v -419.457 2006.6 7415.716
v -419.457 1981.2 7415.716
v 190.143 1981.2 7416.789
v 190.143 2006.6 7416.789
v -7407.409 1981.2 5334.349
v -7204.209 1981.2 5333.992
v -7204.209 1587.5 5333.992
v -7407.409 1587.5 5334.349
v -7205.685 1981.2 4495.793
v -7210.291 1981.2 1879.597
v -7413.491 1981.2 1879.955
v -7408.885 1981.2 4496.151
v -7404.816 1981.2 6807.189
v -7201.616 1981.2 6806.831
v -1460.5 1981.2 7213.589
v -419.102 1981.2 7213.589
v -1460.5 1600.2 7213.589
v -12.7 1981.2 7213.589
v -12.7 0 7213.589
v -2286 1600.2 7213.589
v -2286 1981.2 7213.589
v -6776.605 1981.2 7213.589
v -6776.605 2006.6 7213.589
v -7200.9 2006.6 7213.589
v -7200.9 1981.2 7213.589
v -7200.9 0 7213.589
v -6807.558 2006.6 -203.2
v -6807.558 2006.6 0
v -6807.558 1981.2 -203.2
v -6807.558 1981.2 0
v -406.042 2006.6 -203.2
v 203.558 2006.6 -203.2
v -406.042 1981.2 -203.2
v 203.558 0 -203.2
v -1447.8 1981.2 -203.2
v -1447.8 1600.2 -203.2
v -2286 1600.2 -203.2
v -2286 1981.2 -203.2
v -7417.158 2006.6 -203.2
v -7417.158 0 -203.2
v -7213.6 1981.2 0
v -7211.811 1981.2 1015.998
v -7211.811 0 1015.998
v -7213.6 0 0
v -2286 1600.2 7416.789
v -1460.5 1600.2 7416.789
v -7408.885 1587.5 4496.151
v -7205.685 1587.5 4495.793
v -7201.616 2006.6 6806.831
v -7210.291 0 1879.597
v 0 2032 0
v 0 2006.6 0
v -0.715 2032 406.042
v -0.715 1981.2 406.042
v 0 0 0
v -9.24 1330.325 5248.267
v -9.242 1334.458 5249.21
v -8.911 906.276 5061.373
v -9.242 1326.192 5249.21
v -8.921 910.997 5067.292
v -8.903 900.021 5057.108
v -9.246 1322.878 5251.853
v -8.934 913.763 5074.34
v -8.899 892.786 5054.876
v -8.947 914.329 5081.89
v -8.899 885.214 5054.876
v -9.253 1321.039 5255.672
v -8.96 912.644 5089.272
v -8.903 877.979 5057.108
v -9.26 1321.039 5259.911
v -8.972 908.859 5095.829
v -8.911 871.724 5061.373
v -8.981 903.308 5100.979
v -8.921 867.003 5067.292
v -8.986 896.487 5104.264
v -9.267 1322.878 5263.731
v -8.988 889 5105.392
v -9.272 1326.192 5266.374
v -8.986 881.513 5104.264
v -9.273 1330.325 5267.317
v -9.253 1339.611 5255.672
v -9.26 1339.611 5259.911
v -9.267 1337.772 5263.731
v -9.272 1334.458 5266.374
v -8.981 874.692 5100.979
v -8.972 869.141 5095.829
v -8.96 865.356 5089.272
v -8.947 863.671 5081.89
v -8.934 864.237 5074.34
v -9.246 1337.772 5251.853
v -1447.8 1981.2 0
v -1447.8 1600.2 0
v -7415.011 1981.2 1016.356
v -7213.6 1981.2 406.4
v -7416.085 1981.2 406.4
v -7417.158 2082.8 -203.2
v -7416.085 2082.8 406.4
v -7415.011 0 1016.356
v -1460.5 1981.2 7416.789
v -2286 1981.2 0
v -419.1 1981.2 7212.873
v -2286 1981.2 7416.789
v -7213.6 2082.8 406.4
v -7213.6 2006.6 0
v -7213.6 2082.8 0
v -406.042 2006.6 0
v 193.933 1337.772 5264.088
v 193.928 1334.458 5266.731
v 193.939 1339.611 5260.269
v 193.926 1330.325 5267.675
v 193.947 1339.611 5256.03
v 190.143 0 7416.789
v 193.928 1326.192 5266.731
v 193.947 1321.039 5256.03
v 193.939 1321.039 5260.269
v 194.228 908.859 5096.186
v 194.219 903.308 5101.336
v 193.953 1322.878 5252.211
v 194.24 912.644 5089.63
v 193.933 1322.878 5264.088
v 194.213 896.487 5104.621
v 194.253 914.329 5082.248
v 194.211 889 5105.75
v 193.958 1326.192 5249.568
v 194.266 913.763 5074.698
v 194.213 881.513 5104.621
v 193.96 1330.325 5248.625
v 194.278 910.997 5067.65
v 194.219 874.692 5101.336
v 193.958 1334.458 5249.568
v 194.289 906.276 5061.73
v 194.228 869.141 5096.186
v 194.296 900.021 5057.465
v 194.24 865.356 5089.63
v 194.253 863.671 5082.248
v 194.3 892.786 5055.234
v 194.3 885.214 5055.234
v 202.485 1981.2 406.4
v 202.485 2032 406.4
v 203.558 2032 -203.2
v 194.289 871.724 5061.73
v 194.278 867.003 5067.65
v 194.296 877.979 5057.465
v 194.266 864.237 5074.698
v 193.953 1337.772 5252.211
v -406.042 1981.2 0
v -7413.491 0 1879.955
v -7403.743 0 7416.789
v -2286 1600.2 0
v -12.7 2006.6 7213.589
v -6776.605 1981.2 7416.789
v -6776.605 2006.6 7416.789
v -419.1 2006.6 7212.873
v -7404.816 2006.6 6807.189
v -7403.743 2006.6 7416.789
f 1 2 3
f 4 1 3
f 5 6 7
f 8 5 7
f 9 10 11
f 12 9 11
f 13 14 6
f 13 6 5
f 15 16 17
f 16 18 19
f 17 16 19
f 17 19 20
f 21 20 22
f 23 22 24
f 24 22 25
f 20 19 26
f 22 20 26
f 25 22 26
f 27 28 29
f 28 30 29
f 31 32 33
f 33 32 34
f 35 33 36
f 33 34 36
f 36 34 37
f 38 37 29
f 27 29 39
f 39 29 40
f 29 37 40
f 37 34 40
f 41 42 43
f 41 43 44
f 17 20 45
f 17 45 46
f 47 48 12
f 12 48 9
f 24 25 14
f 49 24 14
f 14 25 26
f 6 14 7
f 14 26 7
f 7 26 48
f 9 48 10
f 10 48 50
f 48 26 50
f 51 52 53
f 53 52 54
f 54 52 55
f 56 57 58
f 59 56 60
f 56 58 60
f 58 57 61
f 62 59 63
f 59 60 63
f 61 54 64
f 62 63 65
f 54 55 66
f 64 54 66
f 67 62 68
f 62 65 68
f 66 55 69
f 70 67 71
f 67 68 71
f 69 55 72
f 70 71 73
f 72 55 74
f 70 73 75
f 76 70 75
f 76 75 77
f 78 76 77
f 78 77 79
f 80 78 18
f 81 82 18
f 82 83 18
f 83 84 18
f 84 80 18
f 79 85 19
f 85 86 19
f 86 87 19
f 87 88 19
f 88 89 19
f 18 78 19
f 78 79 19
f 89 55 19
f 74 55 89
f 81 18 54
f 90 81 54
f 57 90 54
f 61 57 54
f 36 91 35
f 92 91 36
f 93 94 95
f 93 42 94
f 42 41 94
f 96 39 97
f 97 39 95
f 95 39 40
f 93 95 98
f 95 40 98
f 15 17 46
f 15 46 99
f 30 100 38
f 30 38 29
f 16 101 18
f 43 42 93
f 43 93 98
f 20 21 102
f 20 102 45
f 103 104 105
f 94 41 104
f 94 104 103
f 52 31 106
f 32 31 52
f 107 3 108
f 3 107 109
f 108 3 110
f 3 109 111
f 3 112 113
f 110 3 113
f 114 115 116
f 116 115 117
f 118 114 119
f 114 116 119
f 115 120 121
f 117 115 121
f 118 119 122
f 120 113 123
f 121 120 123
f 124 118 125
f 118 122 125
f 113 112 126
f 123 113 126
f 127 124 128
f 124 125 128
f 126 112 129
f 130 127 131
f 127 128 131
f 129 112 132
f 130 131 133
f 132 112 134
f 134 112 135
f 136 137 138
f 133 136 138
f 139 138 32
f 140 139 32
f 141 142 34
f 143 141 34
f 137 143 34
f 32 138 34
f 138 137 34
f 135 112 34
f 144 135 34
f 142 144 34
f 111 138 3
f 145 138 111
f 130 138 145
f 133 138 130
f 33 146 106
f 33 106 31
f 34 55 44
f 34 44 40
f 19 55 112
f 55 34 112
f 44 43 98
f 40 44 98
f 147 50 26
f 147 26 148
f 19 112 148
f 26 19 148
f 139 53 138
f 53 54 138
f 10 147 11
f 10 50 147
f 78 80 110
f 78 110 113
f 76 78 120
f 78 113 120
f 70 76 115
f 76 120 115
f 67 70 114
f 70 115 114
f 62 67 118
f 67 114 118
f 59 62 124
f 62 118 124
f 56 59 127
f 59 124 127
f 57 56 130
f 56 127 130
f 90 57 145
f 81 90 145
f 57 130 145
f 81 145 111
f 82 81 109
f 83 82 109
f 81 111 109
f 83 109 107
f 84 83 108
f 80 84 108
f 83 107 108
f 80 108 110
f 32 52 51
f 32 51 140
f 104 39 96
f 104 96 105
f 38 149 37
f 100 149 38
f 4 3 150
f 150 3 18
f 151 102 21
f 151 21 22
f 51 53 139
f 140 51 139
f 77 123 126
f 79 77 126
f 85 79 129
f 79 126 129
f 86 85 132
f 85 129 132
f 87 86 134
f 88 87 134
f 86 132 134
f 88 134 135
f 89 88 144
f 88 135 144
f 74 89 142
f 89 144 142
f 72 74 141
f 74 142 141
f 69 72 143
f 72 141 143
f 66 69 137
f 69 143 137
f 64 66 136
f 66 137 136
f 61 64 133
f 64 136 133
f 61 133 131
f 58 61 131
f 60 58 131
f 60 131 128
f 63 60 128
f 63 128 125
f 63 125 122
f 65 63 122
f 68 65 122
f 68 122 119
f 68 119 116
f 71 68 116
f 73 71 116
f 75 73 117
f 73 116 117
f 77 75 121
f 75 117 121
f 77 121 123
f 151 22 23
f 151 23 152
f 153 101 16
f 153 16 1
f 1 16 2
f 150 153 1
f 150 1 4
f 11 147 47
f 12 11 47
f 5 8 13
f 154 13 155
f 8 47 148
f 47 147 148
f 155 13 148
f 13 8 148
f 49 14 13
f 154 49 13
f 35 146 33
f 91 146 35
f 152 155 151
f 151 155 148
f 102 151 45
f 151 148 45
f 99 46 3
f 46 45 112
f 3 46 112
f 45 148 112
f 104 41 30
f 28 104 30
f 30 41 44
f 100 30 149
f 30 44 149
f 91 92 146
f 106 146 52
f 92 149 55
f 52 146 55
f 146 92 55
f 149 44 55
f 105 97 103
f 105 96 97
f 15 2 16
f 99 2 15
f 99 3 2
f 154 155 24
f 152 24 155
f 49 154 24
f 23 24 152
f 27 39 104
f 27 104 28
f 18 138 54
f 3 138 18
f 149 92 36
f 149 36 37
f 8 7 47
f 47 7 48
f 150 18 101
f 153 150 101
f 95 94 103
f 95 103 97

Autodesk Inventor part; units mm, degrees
ref_plane "YZ Plane" through (0, 0, 0) normal (1, 0, 0) x (0, 1, 0)
ref_plane "XZ Plane" through (0, 0, 0) normal (0, 1, 0) x (-1, 0, 0)
sketch "Sketch1" plane through (0, 0, 0) normal (0, 1, 0) x (-1, 0, 0)
  line L0 (0, 0) -> (12.7, 7213.5888)
  line L1 (12.7, 7213.5888) -> (7200.9, 7213.5888)
  line L2 (7200.9, 7213.5888) -> (7213.6, 0)
  line L3 (7213.6, 0) -> (0, 0)
  line L4 (7403.7426, 7416.7888) -> (-190.1426, 7416.7888)
  line L5 (-190.1426, 7416.7888) -> (-203.5581, -203.2)
  line L6 (-203.5581, -203.2) -> (7417.1581, -203.2)
  line L7 (7417.1581, -203.2) -> (7403.7426, 7416.7888)
  dimension "d1" = 7188.2
  dimension "d3" = 12.7
  dimension "d4" = 7213.6
  dimension "d5" = 7213.6
  dimension "d6" = 203.2
  dimension "d8" = 7213.6
extrude "Extrusion1" add sketch "Sketch1" along normal blind 1981.2
sketch "Sketch3" plane through (-12.7, 0, 7213.5888) normal (0, 0, -1) x (-1, 0, 0)
  line L0 (7391.0426, 1981.2) -> (-202.8426, 1981.2) projected
  line L1 (2273.3, 2006.6) -> (2273.3, 1600.2)
  line L2 (2273.3, 1600.2) -> (1447.8, 1600.2)
  line L3 (1447.8, 1600.2) -> (1447.8, 2006.6)
  line L4 (0, 0) -> (0, 1981.2) projected
  line L5 (0, 0) -> (7188.2, 0) projected
  line L6 (1447.8, 2006.6) -> (2273.3, 2006.6)
  point P0 (-12.7, 0)
  dimension "d20" = 1447.8
  dimension "d102" = 825.5
  dimension "d103" = 406.4
  dimension "d104" = 25.4
extrude "Extrusion2" cut sketch "Sketch3" against normal up to surface (203.2 mm away)
sketch "Sketch4" plane through (-12.7, 0, 7213.5888) normal (-0.9999985, 0, -0.0017606) x (-0.0017606, 0, 0.9999985)
  line L0 (-7213.6, 0) -> (0, 0) projected
  line L1 (-7213.6, 0) -> (-7213.6, 1981.2) projected
  point P0 (-1955.8, 1330.325)
  dimension "d27" = 1330.325
  dimension "d28" = 5257.8
hole "Hole1" at (-9.2567, 1330.325, 5257.7919) direction (0.9999985, 0, 0.0017606) diameter 19.05 end through all
sketch "Sketch5" plane through (-12.7, 0, 7213.5888) normal (-0.9999985, 0, -0.0017606) x (-0.0017606, 0, 0.9999985)
  line L0 (-7213.6, 0) -> (0, 0) projected
  line L1 (-7213.6, 0) -> (-7213.6, 1981.2) projected
  point P0 (-2133.6, 889)
  dimension "d36" = 889
  dimension "d37" = 5080
hole "Hole2" at (-8.9437, 889, 5079.9921) direction (0.9999985, 0, 0.0017606) diameter 50.8 end through all
sketch "Sketch6" plane through (-7213.6, 0, 0) normal (0, 0, 1) x (1, 0, 0)
  line L0 (7417.1581, 1981.2) -> (-203.5581, 1981.2) projected
  line L1 (7213.6, 0) -> (7213.6, 1981.2) projected
  line L2 (0, 0) -> (7213.6, 0) projected
  line L3 (5765.8, 1600.2) -> (4927.6, 1600.2)
  line L4 (4927.6, 1600.2) -> (4927.6, 2006.6)
  line L5 (4927.6, 2006.6) -> (5765.8, 2006.6)
  line L6 (5765.8, 2006.6) -> (5765.8, 1600.2)
  dimension "d105" = 406.4
  dimension "d106" = 1447.8
  dimension "d107" = 838.2
  dimension "d108" = 25.4
extrude "Extrusion3" cut sketch "Sketch6" against normal up to surface (203.2 mm away)
sketch "Sketch8" plane through (-7200.9, 0, 7213.5888) normal (0.9999985, 0, -0.0017606) x (-0.0017606, 0, -0.9999985)
  line L0 (2717.8, 2070.1) -> (1879.6, 2070.1)
  line L1 (1879.6, 2070.1) -> (1879.6, 1587.5)
  line L2 (1879.6, 1587.5) -> (2717.8, 1587.5)
  line L3 (2717.8, 1587.5) -> (2717.8, 2070.1)
  line L4 (0, 0) -> (0, 1981.2) projected
  line L5 (0, 0) -> (7213.6, 0) projected
  point P0 (7200.9, 0)
  point P1 (4368.8, 0)
  dimension "d56" = 2717.8
  dimension "d118" = 1587.5
  dimension "d119" = 482.6
  dimension "d120" = 838.2
extrude "Extrusion5" cut sketch "Sketch8" against normal up to surface (203.2 mm away)
sketch "Sketch13" plane through (0, 1981.2, 0) normal (0, 1, 0) x (1, 0, 0)
  line L0 (0, 0) -> (-12.7, -7213.5888) projected
  line L1 (190.1426, -7416.7888) -> (203.5581, 203.2) projected
  line L2 (0, 0) -> (203.5581, 203.2)
  line L3 (203.5581, 203.2) -> (202.4848, -406.4)
  line L4 (-0.7149, -406.0423) -> (0, 0)
  line L5 (-0.7149, -406.0423) -> (202.4848, -406.4)
  dimension "d84" = 609.6
extrude "Extrusion9" add sketch "Sketch13" along normal blind 50.8
sketch "Sketch14" plane through (0, 1981.2, 0) normal (0, 1, 0) x (1, 0, 0)
  line L0 (190.1426, -7416.7888) -> (203.5581, 203.2) projected
  line L1 (0, 0) -> (-12.7, -7213.5888) projected
  line L2 (190.1426, -7416.7888) -> (-12.7, -7213.5888)
  line L3 (-12.7, -7213.5888) -> (-419.1003, -7212.8733)
  line L4 (-419.1003, -7212.8733) -> (-419.4574, -7415.7156)
  line L5 (-419.4574, -7415.7156) -> (190.1426, -7416.7888)
  line L6 (-7403.7426, -7416.7888) -> (-2286, -7416.7888) projected
  line L7 (-12.7, -7213.5888) -> (-7200.9, -7213.5888) projected
  line L8 (-7403.7426, -7416.7888) -> (-7200.9, -7213.5888)
  line L9 (-7403.7426, -7416.7888) -> (-6776.6052, -7416.7888)
  line L10 (-7200.9, -7213.5888) -> (-6776.6052, -7213.5888)
  line L11 (-6776.6052, -7213.5888) -> (-6776.6052, -7416.7888)
  point P0 (202.4848, -406.4)
  point P1 (-0.7149, -406.0423)
  dimension "d87" = 609.6
  dimension "d91" = 627.1374
extrude "Extrusion10" add sketch "Sketch14" along normal blind 25.4
sketch "Sketch15" plane through (0, 1981.2, 0) normal (0, 1, 0) x (1, 0, 0)
  line L0 (-7200.9, -7213.5888) -> (-7403.7426, -7416.7888) projected
  line L1 (-7403.7426, -7416.7888) -> (-7200.9, -7213.5888)
  line L2 (-7200.9, -7213.5888) -> (-7201.6161, -6806.8311)
  line L3 (-7200.9, -7213.5888) -> (-7213.6, 0) projected
  line L4 (-7201.6161, -6806.8311) -> (-7404.8158, -6807.1888)
  line L5 (-7417.1581, 203.2) -> (-7403.7426, -7416.7888) projected
  line L6 (-7404.8158, -6807.1888) -> (-7403.7426, -7416.7888)
  point P0 (0, 0)
  point P1 (-7208.5915, -2844.7956)
  point P2 (-7411.7912, -2845.1533)
  dimension "d92" = 609.6
extrude "Extrusion11" add sketch "Sketch15" along normal blind 25.4
sketch "Sketch16" plane through (0, 1981.2, 0) normal (0, 1, 0) x (1, 0, 0)
  line L0 (203.5581, 203.2) -> (-7417.1581, 203.2) projected
  line L1 (-7213.6, 0) -> (0, 0) projected
  line L2 (-7417.1581, 203.2) -> (-7213.6, 0)
  line L3 (-7213.6, 0) -> (-7213.6, -406.4)
  line L4 (-7213.6, -406.4) -> (-7416.0848, -406.4)
  line L5 (-7417.1581, 203.2) -> (-7403.7426, -7416.7888) projected
  line L6 (-7417.1581, 203.2) -> (-7416.0848, -406.4)
  point P0 (-7415.011, -1016.3562)
  dimension "d95" = 609.6
extrude "Extrusion12" add sketch "Sketch16" along normal blind 101.6
sketch "Sketch17" plane through (0, 1981.2, 0) normal (0, 1, 0) x (1, 0, 0)
  line L0 (-7417.1581, 203.2) -> (-7403.7426, -7416.7888) projected
  line L1 (-7417.1581, 203.2) -> (-7213.6, 0) projected
  line L2 (-7417.1581, 203.2) -> (-7213.6, 0)
  line L3 (-7213.6, 0) -> (-6807.5581, 0)
  line L4 (-7213.6, 0) -> (0, 0) projected
  line L5 (-6807.5581, 0) -> (-6807.5581, 203.2)
  line L6 (203.5581, 203.2) -> (-7417.1581, 203.2) projected
  line L7 (-6807.5581, 203.2) -> (-7417.1581, 203.2)
  line L8 (0, 0) -> (203.5581, 203.2) projected
  line L9 (203.5581, 203.2) -> (0, 0)
  line L10 (0, 0) -> (-406.0419, 0)
  line L11 (-406.0419, 0) -> (-406.0419, 203.2)
  line L12 (-406.0419, 203.2) -> (203.5581, 203.2)
  point P0 (-7415.011, -1016.3562)
  dimension "d98" = 609.6
  dimension "d99" = 609.6
extrude "Extrusion13" add sketch "Sketch17" along normal blind 25.4 contours L6 L5 L3 L1 | L6 L8 L4 L11
ref_plane "Work Plane2" through (-7200.9, 0, 7213.5888) normal (-1, 0, 0) x (0, 1, 0)
sketch "Sketch20" plane through (-7204.2092, 1587.5, 5333.9917) normal (0.9999985, 0, -0.0017606) x (-0.0017606, 0, -0.9999985)
  line L0 (5537.5581, -1587.5) -> (-2082.4426, -1587.5) projected
  line L1 (4318, -1587.5) -> (3454.4, -1587.5)
  line L2 (3454.4, -1587.5) -> (3454.4, 419.1)
  line L3 (3454.4, 419.1) -> (4318, 419.1)
  line L4 (4318, 419.1) -> (4318, -1587.5)
  line L5 (5334, 419.1) -> (5334, 495.3) projected
  point P0 (5321.3, -1587.5)
  point P1 (5334, 457.2)
  point P2 (3454.4, -1587.5)
  dimension "d122" = 1016
  dimension "d123" = 2006.6
  dimension "d124" = 863.6
extrude "Extrusion16" cut sketch "Sketch20" against normal up to surface (203.2 mm away)
properties part number "Exterior_Walls" material "Concrete"
